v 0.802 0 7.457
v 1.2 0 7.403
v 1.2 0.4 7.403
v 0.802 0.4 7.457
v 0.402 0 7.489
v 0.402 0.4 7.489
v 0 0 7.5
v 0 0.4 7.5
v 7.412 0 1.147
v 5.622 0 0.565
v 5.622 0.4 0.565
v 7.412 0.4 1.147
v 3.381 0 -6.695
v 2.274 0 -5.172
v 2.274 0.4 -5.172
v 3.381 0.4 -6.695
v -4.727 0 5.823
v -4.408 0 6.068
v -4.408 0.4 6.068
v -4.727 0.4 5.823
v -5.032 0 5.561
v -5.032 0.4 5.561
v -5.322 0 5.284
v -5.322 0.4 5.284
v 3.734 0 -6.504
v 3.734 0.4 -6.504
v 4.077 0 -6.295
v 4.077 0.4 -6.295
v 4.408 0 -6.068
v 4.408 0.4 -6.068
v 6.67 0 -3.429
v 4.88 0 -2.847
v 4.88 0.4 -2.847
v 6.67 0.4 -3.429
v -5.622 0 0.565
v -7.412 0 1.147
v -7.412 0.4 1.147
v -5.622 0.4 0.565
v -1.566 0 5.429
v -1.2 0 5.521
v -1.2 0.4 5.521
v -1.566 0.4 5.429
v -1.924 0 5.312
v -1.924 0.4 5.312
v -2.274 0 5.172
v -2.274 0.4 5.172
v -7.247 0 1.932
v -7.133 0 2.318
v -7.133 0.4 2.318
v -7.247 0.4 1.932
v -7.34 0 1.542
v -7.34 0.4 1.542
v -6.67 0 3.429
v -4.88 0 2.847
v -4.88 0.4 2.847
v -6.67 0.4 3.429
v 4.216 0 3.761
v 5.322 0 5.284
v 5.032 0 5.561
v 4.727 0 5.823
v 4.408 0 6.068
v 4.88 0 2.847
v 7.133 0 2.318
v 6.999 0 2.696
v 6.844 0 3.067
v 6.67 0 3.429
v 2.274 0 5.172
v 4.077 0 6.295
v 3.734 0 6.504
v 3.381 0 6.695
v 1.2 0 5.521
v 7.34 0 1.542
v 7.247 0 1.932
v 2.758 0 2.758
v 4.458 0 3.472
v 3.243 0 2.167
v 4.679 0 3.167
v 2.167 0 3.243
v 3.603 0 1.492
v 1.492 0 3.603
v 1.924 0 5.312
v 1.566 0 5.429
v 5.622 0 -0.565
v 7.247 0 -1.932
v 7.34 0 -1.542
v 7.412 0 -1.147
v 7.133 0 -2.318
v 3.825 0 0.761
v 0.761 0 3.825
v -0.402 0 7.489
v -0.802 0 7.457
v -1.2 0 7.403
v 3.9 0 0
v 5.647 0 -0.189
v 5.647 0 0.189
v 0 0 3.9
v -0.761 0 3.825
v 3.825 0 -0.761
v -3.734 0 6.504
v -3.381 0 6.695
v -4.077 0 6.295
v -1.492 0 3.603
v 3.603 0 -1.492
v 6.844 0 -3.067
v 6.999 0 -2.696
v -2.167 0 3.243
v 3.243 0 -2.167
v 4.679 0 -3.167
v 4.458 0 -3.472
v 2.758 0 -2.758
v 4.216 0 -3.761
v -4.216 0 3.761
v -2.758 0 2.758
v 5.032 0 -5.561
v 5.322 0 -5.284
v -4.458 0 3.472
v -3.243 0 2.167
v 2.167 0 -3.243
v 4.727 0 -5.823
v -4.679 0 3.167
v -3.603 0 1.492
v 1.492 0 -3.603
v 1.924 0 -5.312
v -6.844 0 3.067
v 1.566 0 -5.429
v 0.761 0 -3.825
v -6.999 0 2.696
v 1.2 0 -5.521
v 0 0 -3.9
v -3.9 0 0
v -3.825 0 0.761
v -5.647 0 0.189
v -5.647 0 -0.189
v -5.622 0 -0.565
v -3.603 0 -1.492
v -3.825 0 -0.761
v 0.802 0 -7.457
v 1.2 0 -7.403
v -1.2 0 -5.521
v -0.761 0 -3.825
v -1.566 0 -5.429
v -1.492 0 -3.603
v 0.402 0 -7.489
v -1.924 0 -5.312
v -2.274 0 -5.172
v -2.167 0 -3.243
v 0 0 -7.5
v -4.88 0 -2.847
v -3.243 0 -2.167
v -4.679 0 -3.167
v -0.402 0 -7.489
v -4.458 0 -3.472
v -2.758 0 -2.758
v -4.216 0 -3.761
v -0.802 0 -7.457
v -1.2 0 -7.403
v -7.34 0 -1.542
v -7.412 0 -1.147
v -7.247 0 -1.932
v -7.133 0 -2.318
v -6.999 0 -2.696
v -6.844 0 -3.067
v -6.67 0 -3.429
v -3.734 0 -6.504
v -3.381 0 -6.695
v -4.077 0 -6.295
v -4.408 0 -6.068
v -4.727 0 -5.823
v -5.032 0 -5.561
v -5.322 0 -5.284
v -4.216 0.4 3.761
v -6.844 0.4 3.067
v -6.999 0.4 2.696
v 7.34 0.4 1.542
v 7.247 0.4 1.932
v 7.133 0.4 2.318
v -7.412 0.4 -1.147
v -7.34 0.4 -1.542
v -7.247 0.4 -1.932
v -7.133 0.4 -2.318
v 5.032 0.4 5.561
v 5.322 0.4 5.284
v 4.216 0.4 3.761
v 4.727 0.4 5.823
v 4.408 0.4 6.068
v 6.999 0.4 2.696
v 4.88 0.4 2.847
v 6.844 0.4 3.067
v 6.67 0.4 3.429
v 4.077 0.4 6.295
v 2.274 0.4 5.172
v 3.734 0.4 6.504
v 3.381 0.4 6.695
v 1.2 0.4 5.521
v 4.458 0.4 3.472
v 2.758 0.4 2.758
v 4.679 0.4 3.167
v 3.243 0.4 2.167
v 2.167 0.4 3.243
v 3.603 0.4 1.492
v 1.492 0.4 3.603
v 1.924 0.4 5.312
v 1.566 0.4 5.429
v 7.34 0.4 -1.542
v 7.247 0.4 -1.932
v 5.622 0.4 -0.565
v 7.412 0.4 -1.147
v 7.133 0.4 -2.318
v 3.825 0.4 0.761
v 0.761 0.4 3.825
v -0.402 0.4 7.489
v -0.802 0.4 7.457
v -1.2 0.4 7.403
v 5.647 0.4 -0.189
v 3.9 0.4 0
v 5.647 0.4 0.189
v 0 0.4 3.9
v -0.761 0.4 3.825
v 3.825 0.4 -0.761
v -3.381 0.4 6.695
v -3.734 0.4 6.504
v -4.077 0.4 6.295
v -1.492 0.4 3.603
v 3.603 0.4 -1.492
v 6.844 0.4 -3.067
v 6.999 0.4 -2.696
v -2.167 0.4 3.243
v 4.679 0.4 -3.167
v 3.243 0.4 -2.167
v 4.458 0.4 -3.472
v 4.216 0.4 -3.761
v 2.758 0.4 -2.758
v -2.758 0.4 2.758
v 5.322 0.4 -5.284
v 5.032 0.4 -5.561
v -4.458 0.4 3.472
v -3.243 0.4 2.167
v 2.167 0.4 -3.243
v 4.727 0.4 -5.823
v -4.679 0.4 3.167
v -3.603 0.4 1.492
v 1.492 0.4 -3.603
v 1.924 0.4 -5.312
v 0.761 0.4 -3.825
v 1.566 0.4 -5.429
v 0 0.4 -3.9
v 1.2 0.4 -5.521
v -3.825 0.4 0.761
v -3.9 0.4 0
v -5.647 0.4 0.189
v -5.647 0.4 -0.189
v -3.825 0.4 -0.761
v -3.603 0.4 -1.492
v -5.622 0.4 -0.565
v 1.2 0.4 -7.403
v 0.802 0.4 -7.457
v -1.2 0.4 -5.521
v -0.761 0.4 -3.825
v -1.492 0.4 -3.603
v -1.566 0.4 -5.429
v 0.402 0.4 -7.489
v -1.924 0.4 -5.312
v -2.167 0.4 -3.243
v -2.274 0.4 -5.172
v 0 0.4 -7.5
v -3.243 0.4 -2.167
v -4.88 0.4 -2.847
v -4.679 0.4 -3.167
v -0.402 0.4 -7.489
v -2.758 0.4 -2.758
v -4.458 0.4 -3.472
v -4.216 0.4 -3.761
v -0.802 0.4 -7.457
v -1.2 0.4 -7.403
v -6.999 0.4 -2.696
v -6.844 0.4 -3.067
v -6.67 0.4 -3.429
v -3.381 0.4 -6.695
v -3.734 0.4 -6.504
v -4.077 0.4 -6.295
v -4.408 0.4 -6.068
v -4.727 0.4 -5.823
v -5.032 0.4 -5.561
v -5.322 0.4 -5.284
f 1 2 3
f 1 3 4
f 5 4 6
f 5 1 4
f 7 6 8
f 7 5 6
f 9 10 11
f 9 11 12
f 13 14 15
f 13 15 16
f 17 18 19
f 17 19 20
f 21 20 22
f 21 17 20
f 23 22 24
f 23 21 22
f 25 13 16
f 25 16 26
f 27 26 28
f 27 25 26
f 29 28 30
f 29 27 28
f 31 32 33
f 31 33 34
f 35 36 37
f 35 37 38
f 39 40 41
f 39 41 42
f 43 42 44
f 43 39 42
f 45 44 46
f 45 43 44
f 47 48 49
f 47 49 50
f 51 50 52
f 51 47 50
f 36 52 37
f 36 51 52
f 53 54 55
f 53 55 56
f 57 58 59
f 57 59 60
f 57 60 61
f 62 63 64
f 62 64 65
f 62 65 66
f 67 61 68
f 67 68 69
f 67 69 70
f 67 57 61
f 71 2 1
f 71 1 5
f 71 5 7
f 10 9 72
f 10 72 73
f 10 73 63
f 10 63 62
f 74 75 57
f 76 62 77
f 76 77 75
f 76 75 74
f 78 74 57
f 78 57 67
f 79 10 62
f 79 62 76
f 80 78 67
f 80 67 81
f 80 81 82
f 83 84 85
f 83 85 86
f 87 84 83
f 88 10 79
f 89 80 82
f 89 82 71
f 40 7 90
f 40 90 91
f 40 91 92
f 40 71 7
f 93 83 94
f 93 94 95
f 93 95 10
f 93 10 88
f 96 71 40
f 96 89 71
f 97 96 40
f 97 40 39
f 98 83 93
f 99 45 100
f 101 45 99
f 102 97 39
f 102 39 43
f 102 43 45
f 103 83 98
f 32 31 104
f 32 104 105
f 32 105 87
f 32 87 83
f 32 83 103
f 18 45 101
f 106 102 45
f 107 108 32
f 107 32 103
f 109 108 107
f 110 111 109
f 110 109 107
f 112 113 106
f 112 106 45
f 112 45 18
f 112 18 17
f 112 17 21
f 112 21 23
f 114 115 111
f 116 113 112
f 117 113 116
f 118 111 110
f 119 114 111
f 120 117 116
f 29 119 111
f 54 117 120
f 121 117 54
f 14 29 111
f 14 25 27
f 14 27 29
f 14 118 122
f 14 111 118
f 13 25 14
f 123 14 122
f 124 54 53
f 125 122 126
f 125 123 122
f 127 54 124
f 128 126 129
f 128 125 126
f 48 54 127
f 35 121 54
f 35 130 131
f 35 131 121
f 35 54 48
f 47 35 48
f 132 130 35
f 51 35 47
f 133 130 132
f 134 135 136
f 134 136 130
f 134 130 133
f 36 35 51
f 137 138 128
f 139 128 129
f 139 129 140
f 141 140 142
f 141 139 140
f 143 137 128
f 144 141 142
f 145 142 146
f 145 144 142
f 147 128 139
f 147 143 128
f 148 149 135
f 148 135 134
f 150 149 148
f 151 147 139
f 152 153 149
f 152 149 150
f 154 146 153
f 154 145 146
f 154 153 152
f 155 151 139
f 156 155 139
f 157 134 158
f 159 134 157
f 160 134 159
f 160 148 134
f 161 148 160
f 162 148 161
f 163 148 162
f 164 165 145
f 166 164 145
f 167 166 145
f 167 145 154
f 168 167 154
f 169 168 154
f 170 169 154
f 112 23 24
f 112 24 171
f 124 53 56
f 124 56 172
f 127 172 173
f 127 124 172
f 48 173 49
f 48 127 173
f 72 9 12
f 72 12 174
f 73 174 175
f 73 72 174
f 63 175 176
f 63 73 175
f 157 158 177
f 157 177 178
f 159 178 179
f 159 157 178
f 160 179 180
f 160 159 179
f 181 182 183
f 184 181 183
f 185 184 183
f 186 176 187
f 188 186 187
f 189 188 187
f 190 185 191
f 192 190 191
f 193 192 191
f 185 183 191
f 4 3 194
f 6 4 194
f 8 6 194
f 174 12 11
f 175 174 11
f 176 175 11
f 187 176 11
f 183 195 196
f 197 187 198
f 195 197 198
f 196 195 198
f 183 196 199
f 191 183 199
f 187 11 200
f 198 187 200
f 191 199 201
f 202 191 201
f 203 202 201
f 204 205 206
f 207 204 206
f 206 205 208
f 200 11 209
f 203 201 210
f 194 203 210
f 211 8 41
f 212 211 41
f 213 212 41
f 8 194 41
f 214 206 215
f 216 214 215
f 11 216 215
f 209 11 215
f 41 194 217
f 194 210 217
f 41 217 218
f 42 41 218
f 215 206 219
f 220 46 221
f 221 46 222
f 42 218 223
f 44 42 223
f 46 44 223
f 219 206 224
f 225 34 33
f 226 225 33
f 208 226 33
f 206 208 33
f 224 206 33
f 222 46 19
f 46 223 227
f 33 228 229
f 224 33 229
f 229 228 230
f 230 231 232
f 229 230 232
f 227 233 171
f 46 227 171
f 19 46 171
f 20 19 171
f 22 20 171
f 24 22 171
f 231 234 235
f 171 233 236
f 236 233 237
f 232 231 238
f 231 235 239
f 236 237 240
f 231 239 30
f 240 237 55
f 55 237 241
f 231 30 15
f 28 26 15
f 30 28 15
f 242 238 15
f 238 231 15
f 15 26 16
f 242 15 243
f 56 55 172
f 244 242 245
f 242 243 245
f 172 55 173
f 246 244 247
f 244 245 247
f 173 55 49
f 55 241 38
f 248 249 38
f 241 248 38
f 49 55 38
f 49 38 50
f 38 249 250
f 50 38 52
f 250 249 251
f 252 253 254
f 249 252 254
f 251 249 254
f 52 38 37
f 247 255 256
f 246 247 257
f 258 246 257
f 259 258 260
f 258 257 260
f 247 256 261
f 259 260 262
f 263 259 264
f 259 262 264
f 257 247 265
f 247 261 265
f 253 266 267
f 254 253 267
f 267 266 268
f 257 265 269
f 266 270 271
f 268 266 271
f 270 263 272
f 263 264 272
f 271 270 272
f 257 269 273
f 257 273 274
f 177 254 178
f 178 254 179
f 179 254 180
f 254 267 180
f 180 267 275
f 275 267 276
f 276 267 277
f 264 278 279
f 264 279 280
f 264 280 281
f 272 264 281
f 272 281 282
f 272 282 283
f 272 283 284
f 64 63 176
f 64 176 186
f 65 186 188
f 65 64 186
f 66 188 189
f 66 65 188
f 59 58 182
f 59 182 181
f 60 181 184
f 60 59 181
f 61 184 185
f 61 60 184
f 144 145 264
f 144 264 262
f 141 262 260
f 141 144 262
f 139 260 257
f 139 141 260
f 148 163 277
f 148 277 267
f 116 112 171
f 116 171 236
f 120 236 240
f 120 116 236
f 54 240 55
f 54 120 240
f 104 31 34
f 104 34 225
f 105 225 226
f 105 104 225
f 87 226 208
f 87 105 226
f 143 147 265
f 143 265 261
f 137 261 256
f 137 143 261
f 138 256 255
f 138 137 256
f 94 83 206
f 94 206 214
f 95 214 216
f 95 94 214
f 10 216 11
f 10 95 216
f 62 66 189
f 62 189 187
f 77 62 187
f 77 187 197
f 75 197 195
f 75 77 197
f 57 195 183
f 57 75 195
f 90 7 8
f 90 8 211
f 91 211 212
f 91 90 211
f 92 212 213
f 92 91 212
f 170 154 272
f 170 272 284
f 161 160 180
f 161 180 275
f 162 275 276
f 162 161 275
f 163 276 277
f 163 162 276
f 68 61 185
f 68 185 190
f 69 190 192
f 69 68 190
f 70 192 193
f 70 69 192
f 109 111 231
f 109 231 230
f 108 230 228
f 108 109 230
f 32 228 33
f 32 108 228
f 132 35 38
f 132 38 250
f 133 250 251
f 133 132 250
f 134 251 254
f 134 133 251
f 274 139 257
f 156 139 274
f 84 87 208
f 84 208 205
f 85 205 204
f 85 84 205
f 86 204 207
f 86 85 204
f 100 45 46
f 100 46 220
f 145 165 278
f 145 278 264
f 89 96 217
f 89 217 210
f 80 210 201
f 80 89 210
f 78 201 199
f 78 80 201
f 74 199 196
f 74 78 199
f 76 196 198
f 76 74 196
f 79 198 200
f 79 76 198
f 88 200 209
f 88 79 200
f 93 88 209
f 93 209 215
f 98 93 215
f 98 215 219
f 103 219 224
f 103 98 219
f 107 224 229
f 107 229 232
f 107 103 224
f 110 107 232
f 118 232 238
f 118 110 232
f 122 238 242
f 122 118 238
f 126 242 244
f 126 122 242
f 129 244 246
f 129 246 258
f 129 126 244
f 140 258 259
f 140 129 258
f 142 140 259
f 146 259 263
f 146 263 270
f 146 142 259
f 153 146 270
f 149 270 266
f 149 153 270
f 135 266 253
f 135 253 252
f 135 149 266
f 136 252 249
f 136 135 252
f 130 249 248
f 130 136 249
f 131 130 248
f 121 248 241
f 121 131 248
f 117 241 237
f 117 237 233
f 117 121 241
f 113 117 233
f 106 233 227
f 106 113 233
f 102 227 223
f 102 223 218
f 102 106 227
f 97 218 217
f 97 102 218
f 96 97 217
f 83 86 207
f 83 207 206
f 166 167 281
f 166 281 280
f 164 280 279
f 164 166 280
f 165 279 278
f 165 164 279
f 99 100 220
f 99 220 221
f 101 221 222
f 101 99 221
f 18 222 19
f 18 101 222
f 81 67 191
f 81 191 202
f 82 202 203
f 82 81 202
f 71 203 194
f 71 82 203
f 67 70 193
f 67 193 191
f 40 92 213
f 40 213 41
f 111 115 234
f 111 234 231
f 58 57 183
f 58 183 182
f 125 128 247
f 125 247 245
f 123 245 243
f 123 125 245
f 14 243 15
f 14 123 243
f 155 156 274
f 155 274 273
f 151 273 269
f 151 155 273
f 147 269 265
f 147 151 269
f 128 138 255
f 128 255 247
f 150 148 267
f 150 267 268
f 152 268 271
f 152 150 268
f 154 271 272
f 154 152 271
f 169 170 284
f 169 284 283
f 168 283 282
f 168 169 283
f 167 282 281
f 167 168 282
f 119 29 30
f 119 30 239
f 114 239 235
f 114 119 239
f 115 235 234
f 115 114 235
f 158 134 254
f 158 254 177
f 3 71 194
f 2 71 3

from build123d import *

# Parameters (mm, degrees)
SKETCH1_R           = 3.9
BOSS_EXTRUDE1_DEPTH = 0.4


with BuildPart() as part:
    # Sketch1 → Boss-Extrude1 (new body)
    with BuildSketch(Plane(origin=(0, 0, 0), x_dir=(1, 0, 0), z_dir=(0, 1, 0))):
        with BuildLine():
            Line((-1.2, 5.521095906), (-1.2, 7.403377608))
            ThreePointArc((-1.2, 7.403377608), (-0.601941834, 7.475805377), (0, 7.5))
            ThreePointArc((0, 7.5), (0.601941834, 7.475805377), (1.2, 7.403377608))
            Line((1.2, 7.403377608), (1.2, 5.521095906))
            ThreePointArc((1.2, 5.521095906), (1.745946018, 5.373469317), (2.274398357, 5.172002718))
            Line((2.274398357, 5.172002718), (3.380775782, 6.694800603))
            ThreePointArc((3.380775782, 6.694800603), (3.907186976, 6.401866129), (4.408389392, 6.067627458))
            ThreePointArc((4.408389392, 6.067627458), (4.881149323, 5.694241063), (5.322416568, 5.284115998))
            Line((5.322416568, 5.284115998), (4.216039143, 3.761318113))
            ThreePointArc((4.216039143, 3.761318113), (4.570946018, 3.320986675), (4.880053845, 2.847380282))
            Line((4.880053845, 2.847380282), (6.670210123, 3.429037316))
            ThreePointArc((6.670210123, 3.429037316), (6.923903162, 2.882631612), (7.132923872, 2.317627458))
            ThreePointArc((7.132923872, 2.317627458), (7.295923674, 1.737670204), (7.41185091, 1.146501677))
            Line((7.41185091, 1.146501677), (5.621694631, 0.564844643))
            ThreePointArc((5.621694631, 0.564844643), (5.65, 0), (5.621694631, -0.564844643))
            Line((5.621694631, -0.564844643), (7.41185091, -1.146501677))
            ThreePointArc((7.41185091, -1.146501677), (7.295923674, -1.737670204), (7.132923872, -2.317627458))
            ThreePointArc((7.132923872, -2.317627458), (6.923903162, -2.882631612), (6.670210123, -3.429037316))
            Line((6.670210123, -3.429037316), (4.880053845, -2.847380282))
            ThreePointArc((4.880053845, -2.847380282), (4.570946018, -3.320986675), (4.216039143, -3.761318113))
            Line((4.216039143, -3.761318113), (5.322416568, -5.284115998))
            ThreePointArc((5.322416568, -5.284115998), (4.881149323, -5.694241063), (4.408389392, -6.067627458))
            ThreePointArc((4.408389392, -6.067627458), (3.907186976, -6.401866129), (3.380775782, -6.694800603))
            Line((3.380775782, -6.694800603), (2.274398357, -5.172002718))
            ThreePointArc((2.274398357, -5.172002718), (1.745946018, -5.373469317), (1.2, -5.521095906))
            Line((1.2, -5.521095906), (1.2, -7.403377608))
            ThreePointArc((1.2, -7.403377608), (0.601941834, -7.475805377), (0, -7.5))
            ThreePointArc((0, -7.5), (-0.601941834, -7.475805377), (-1.2, -7.403377608))
            Line((-1.2, -7.403377608), (-1.2, -5.521095906))
            ThreePointArc((-1.2, -5.521095906), (-1.745946018, -5.373469317), (-2.274398357, -5.172002718))
            Line((-2.274398357, -5.172002718), (-3.380775782, -6.694800603))
            ThreePointArc((-3.380775782, -6.694800603), (-3.907186976, -6.401866129), (-4.408389392, -6.067627458))
            ThreePointArc((-4.408389392, -6.067627458), (-4.881149323, -5.694241063), (-5.322416568, -5.284115998))
            Line((-5.322416568, -5.284115998), (-4.216039143, -3.761318113))
            ThreePointArc((-4.216039143, -3.761318113), (-4.570946018, -3.320986675), (-4.880053845, -2.847380282))
            Line((-4.880053845, -2.847380282), (-6.670210123, -3.429037316))
            ThreePointArc((-6.670210123, -3.429037316), (-6.923903162, -2.882631612), (-7.132923872, -2.317627458))
            ThreePointArc((-7.132923872, -2.317627458), (-7.295923674, -1.737670204), (-7.41185091, -1.146501677))
            Line((-7.41185091, -1.146501677), (-5.621694631, -0.564844643))
            ThreePointArc((-5.621694631, -0.564844643), (-5.65, 0), (-5.621694631, 0.564844643))
            Line((-5.621694631, 0.564844643), (-7.41185091, 1.146501677))
            ThreePointArc((-7.41185091, 1.146501677), (-7.295923674, 1.737670204), (-7.132923872, 2.317627458))
            ThreePointArc((-7.132923872, 2.317627458), (-6.923903162, 2.882631612), (-6.670210123, 3.429037316))
            Line((-6.670210123, 3.429037316), (-4.880053845, 2.847380282))
            ThreePointArc((-4.880053845, 2.847380282), (-4.570946018, 3.320986675), (-4.216039143, 3.761318113))
            Line((-4.216039143, 3.761318113), (-5.322416568, 5.284115998))
            ThreePointArc((-5.322416568, 5.284115998), (-4.881149323, 5.694241063), (-4.408389392, 6.067627458))
            ThreePointArc((-4.408389392, 6.067627458), (-3.907186976, 6.401866129), (-3.380775782, 6.694800603))
            Line((-3.380775782, 6.694800603), (-2.274398357, 5.172002718))
            ThreePointArc((-2.274398357, 5.172002718), (-1.745946018, 5.373469317), (-1.2, 5.521095906))
        make_face()
        with Locations(Location((0, 0, 0), (0, 0, 270))):
            Circle(SKETCH1_R, mode=Mode.SUBTRACT)
    extrude(amount=BOSS_EXTRUDE1_DEPTH)


solid = part.part
